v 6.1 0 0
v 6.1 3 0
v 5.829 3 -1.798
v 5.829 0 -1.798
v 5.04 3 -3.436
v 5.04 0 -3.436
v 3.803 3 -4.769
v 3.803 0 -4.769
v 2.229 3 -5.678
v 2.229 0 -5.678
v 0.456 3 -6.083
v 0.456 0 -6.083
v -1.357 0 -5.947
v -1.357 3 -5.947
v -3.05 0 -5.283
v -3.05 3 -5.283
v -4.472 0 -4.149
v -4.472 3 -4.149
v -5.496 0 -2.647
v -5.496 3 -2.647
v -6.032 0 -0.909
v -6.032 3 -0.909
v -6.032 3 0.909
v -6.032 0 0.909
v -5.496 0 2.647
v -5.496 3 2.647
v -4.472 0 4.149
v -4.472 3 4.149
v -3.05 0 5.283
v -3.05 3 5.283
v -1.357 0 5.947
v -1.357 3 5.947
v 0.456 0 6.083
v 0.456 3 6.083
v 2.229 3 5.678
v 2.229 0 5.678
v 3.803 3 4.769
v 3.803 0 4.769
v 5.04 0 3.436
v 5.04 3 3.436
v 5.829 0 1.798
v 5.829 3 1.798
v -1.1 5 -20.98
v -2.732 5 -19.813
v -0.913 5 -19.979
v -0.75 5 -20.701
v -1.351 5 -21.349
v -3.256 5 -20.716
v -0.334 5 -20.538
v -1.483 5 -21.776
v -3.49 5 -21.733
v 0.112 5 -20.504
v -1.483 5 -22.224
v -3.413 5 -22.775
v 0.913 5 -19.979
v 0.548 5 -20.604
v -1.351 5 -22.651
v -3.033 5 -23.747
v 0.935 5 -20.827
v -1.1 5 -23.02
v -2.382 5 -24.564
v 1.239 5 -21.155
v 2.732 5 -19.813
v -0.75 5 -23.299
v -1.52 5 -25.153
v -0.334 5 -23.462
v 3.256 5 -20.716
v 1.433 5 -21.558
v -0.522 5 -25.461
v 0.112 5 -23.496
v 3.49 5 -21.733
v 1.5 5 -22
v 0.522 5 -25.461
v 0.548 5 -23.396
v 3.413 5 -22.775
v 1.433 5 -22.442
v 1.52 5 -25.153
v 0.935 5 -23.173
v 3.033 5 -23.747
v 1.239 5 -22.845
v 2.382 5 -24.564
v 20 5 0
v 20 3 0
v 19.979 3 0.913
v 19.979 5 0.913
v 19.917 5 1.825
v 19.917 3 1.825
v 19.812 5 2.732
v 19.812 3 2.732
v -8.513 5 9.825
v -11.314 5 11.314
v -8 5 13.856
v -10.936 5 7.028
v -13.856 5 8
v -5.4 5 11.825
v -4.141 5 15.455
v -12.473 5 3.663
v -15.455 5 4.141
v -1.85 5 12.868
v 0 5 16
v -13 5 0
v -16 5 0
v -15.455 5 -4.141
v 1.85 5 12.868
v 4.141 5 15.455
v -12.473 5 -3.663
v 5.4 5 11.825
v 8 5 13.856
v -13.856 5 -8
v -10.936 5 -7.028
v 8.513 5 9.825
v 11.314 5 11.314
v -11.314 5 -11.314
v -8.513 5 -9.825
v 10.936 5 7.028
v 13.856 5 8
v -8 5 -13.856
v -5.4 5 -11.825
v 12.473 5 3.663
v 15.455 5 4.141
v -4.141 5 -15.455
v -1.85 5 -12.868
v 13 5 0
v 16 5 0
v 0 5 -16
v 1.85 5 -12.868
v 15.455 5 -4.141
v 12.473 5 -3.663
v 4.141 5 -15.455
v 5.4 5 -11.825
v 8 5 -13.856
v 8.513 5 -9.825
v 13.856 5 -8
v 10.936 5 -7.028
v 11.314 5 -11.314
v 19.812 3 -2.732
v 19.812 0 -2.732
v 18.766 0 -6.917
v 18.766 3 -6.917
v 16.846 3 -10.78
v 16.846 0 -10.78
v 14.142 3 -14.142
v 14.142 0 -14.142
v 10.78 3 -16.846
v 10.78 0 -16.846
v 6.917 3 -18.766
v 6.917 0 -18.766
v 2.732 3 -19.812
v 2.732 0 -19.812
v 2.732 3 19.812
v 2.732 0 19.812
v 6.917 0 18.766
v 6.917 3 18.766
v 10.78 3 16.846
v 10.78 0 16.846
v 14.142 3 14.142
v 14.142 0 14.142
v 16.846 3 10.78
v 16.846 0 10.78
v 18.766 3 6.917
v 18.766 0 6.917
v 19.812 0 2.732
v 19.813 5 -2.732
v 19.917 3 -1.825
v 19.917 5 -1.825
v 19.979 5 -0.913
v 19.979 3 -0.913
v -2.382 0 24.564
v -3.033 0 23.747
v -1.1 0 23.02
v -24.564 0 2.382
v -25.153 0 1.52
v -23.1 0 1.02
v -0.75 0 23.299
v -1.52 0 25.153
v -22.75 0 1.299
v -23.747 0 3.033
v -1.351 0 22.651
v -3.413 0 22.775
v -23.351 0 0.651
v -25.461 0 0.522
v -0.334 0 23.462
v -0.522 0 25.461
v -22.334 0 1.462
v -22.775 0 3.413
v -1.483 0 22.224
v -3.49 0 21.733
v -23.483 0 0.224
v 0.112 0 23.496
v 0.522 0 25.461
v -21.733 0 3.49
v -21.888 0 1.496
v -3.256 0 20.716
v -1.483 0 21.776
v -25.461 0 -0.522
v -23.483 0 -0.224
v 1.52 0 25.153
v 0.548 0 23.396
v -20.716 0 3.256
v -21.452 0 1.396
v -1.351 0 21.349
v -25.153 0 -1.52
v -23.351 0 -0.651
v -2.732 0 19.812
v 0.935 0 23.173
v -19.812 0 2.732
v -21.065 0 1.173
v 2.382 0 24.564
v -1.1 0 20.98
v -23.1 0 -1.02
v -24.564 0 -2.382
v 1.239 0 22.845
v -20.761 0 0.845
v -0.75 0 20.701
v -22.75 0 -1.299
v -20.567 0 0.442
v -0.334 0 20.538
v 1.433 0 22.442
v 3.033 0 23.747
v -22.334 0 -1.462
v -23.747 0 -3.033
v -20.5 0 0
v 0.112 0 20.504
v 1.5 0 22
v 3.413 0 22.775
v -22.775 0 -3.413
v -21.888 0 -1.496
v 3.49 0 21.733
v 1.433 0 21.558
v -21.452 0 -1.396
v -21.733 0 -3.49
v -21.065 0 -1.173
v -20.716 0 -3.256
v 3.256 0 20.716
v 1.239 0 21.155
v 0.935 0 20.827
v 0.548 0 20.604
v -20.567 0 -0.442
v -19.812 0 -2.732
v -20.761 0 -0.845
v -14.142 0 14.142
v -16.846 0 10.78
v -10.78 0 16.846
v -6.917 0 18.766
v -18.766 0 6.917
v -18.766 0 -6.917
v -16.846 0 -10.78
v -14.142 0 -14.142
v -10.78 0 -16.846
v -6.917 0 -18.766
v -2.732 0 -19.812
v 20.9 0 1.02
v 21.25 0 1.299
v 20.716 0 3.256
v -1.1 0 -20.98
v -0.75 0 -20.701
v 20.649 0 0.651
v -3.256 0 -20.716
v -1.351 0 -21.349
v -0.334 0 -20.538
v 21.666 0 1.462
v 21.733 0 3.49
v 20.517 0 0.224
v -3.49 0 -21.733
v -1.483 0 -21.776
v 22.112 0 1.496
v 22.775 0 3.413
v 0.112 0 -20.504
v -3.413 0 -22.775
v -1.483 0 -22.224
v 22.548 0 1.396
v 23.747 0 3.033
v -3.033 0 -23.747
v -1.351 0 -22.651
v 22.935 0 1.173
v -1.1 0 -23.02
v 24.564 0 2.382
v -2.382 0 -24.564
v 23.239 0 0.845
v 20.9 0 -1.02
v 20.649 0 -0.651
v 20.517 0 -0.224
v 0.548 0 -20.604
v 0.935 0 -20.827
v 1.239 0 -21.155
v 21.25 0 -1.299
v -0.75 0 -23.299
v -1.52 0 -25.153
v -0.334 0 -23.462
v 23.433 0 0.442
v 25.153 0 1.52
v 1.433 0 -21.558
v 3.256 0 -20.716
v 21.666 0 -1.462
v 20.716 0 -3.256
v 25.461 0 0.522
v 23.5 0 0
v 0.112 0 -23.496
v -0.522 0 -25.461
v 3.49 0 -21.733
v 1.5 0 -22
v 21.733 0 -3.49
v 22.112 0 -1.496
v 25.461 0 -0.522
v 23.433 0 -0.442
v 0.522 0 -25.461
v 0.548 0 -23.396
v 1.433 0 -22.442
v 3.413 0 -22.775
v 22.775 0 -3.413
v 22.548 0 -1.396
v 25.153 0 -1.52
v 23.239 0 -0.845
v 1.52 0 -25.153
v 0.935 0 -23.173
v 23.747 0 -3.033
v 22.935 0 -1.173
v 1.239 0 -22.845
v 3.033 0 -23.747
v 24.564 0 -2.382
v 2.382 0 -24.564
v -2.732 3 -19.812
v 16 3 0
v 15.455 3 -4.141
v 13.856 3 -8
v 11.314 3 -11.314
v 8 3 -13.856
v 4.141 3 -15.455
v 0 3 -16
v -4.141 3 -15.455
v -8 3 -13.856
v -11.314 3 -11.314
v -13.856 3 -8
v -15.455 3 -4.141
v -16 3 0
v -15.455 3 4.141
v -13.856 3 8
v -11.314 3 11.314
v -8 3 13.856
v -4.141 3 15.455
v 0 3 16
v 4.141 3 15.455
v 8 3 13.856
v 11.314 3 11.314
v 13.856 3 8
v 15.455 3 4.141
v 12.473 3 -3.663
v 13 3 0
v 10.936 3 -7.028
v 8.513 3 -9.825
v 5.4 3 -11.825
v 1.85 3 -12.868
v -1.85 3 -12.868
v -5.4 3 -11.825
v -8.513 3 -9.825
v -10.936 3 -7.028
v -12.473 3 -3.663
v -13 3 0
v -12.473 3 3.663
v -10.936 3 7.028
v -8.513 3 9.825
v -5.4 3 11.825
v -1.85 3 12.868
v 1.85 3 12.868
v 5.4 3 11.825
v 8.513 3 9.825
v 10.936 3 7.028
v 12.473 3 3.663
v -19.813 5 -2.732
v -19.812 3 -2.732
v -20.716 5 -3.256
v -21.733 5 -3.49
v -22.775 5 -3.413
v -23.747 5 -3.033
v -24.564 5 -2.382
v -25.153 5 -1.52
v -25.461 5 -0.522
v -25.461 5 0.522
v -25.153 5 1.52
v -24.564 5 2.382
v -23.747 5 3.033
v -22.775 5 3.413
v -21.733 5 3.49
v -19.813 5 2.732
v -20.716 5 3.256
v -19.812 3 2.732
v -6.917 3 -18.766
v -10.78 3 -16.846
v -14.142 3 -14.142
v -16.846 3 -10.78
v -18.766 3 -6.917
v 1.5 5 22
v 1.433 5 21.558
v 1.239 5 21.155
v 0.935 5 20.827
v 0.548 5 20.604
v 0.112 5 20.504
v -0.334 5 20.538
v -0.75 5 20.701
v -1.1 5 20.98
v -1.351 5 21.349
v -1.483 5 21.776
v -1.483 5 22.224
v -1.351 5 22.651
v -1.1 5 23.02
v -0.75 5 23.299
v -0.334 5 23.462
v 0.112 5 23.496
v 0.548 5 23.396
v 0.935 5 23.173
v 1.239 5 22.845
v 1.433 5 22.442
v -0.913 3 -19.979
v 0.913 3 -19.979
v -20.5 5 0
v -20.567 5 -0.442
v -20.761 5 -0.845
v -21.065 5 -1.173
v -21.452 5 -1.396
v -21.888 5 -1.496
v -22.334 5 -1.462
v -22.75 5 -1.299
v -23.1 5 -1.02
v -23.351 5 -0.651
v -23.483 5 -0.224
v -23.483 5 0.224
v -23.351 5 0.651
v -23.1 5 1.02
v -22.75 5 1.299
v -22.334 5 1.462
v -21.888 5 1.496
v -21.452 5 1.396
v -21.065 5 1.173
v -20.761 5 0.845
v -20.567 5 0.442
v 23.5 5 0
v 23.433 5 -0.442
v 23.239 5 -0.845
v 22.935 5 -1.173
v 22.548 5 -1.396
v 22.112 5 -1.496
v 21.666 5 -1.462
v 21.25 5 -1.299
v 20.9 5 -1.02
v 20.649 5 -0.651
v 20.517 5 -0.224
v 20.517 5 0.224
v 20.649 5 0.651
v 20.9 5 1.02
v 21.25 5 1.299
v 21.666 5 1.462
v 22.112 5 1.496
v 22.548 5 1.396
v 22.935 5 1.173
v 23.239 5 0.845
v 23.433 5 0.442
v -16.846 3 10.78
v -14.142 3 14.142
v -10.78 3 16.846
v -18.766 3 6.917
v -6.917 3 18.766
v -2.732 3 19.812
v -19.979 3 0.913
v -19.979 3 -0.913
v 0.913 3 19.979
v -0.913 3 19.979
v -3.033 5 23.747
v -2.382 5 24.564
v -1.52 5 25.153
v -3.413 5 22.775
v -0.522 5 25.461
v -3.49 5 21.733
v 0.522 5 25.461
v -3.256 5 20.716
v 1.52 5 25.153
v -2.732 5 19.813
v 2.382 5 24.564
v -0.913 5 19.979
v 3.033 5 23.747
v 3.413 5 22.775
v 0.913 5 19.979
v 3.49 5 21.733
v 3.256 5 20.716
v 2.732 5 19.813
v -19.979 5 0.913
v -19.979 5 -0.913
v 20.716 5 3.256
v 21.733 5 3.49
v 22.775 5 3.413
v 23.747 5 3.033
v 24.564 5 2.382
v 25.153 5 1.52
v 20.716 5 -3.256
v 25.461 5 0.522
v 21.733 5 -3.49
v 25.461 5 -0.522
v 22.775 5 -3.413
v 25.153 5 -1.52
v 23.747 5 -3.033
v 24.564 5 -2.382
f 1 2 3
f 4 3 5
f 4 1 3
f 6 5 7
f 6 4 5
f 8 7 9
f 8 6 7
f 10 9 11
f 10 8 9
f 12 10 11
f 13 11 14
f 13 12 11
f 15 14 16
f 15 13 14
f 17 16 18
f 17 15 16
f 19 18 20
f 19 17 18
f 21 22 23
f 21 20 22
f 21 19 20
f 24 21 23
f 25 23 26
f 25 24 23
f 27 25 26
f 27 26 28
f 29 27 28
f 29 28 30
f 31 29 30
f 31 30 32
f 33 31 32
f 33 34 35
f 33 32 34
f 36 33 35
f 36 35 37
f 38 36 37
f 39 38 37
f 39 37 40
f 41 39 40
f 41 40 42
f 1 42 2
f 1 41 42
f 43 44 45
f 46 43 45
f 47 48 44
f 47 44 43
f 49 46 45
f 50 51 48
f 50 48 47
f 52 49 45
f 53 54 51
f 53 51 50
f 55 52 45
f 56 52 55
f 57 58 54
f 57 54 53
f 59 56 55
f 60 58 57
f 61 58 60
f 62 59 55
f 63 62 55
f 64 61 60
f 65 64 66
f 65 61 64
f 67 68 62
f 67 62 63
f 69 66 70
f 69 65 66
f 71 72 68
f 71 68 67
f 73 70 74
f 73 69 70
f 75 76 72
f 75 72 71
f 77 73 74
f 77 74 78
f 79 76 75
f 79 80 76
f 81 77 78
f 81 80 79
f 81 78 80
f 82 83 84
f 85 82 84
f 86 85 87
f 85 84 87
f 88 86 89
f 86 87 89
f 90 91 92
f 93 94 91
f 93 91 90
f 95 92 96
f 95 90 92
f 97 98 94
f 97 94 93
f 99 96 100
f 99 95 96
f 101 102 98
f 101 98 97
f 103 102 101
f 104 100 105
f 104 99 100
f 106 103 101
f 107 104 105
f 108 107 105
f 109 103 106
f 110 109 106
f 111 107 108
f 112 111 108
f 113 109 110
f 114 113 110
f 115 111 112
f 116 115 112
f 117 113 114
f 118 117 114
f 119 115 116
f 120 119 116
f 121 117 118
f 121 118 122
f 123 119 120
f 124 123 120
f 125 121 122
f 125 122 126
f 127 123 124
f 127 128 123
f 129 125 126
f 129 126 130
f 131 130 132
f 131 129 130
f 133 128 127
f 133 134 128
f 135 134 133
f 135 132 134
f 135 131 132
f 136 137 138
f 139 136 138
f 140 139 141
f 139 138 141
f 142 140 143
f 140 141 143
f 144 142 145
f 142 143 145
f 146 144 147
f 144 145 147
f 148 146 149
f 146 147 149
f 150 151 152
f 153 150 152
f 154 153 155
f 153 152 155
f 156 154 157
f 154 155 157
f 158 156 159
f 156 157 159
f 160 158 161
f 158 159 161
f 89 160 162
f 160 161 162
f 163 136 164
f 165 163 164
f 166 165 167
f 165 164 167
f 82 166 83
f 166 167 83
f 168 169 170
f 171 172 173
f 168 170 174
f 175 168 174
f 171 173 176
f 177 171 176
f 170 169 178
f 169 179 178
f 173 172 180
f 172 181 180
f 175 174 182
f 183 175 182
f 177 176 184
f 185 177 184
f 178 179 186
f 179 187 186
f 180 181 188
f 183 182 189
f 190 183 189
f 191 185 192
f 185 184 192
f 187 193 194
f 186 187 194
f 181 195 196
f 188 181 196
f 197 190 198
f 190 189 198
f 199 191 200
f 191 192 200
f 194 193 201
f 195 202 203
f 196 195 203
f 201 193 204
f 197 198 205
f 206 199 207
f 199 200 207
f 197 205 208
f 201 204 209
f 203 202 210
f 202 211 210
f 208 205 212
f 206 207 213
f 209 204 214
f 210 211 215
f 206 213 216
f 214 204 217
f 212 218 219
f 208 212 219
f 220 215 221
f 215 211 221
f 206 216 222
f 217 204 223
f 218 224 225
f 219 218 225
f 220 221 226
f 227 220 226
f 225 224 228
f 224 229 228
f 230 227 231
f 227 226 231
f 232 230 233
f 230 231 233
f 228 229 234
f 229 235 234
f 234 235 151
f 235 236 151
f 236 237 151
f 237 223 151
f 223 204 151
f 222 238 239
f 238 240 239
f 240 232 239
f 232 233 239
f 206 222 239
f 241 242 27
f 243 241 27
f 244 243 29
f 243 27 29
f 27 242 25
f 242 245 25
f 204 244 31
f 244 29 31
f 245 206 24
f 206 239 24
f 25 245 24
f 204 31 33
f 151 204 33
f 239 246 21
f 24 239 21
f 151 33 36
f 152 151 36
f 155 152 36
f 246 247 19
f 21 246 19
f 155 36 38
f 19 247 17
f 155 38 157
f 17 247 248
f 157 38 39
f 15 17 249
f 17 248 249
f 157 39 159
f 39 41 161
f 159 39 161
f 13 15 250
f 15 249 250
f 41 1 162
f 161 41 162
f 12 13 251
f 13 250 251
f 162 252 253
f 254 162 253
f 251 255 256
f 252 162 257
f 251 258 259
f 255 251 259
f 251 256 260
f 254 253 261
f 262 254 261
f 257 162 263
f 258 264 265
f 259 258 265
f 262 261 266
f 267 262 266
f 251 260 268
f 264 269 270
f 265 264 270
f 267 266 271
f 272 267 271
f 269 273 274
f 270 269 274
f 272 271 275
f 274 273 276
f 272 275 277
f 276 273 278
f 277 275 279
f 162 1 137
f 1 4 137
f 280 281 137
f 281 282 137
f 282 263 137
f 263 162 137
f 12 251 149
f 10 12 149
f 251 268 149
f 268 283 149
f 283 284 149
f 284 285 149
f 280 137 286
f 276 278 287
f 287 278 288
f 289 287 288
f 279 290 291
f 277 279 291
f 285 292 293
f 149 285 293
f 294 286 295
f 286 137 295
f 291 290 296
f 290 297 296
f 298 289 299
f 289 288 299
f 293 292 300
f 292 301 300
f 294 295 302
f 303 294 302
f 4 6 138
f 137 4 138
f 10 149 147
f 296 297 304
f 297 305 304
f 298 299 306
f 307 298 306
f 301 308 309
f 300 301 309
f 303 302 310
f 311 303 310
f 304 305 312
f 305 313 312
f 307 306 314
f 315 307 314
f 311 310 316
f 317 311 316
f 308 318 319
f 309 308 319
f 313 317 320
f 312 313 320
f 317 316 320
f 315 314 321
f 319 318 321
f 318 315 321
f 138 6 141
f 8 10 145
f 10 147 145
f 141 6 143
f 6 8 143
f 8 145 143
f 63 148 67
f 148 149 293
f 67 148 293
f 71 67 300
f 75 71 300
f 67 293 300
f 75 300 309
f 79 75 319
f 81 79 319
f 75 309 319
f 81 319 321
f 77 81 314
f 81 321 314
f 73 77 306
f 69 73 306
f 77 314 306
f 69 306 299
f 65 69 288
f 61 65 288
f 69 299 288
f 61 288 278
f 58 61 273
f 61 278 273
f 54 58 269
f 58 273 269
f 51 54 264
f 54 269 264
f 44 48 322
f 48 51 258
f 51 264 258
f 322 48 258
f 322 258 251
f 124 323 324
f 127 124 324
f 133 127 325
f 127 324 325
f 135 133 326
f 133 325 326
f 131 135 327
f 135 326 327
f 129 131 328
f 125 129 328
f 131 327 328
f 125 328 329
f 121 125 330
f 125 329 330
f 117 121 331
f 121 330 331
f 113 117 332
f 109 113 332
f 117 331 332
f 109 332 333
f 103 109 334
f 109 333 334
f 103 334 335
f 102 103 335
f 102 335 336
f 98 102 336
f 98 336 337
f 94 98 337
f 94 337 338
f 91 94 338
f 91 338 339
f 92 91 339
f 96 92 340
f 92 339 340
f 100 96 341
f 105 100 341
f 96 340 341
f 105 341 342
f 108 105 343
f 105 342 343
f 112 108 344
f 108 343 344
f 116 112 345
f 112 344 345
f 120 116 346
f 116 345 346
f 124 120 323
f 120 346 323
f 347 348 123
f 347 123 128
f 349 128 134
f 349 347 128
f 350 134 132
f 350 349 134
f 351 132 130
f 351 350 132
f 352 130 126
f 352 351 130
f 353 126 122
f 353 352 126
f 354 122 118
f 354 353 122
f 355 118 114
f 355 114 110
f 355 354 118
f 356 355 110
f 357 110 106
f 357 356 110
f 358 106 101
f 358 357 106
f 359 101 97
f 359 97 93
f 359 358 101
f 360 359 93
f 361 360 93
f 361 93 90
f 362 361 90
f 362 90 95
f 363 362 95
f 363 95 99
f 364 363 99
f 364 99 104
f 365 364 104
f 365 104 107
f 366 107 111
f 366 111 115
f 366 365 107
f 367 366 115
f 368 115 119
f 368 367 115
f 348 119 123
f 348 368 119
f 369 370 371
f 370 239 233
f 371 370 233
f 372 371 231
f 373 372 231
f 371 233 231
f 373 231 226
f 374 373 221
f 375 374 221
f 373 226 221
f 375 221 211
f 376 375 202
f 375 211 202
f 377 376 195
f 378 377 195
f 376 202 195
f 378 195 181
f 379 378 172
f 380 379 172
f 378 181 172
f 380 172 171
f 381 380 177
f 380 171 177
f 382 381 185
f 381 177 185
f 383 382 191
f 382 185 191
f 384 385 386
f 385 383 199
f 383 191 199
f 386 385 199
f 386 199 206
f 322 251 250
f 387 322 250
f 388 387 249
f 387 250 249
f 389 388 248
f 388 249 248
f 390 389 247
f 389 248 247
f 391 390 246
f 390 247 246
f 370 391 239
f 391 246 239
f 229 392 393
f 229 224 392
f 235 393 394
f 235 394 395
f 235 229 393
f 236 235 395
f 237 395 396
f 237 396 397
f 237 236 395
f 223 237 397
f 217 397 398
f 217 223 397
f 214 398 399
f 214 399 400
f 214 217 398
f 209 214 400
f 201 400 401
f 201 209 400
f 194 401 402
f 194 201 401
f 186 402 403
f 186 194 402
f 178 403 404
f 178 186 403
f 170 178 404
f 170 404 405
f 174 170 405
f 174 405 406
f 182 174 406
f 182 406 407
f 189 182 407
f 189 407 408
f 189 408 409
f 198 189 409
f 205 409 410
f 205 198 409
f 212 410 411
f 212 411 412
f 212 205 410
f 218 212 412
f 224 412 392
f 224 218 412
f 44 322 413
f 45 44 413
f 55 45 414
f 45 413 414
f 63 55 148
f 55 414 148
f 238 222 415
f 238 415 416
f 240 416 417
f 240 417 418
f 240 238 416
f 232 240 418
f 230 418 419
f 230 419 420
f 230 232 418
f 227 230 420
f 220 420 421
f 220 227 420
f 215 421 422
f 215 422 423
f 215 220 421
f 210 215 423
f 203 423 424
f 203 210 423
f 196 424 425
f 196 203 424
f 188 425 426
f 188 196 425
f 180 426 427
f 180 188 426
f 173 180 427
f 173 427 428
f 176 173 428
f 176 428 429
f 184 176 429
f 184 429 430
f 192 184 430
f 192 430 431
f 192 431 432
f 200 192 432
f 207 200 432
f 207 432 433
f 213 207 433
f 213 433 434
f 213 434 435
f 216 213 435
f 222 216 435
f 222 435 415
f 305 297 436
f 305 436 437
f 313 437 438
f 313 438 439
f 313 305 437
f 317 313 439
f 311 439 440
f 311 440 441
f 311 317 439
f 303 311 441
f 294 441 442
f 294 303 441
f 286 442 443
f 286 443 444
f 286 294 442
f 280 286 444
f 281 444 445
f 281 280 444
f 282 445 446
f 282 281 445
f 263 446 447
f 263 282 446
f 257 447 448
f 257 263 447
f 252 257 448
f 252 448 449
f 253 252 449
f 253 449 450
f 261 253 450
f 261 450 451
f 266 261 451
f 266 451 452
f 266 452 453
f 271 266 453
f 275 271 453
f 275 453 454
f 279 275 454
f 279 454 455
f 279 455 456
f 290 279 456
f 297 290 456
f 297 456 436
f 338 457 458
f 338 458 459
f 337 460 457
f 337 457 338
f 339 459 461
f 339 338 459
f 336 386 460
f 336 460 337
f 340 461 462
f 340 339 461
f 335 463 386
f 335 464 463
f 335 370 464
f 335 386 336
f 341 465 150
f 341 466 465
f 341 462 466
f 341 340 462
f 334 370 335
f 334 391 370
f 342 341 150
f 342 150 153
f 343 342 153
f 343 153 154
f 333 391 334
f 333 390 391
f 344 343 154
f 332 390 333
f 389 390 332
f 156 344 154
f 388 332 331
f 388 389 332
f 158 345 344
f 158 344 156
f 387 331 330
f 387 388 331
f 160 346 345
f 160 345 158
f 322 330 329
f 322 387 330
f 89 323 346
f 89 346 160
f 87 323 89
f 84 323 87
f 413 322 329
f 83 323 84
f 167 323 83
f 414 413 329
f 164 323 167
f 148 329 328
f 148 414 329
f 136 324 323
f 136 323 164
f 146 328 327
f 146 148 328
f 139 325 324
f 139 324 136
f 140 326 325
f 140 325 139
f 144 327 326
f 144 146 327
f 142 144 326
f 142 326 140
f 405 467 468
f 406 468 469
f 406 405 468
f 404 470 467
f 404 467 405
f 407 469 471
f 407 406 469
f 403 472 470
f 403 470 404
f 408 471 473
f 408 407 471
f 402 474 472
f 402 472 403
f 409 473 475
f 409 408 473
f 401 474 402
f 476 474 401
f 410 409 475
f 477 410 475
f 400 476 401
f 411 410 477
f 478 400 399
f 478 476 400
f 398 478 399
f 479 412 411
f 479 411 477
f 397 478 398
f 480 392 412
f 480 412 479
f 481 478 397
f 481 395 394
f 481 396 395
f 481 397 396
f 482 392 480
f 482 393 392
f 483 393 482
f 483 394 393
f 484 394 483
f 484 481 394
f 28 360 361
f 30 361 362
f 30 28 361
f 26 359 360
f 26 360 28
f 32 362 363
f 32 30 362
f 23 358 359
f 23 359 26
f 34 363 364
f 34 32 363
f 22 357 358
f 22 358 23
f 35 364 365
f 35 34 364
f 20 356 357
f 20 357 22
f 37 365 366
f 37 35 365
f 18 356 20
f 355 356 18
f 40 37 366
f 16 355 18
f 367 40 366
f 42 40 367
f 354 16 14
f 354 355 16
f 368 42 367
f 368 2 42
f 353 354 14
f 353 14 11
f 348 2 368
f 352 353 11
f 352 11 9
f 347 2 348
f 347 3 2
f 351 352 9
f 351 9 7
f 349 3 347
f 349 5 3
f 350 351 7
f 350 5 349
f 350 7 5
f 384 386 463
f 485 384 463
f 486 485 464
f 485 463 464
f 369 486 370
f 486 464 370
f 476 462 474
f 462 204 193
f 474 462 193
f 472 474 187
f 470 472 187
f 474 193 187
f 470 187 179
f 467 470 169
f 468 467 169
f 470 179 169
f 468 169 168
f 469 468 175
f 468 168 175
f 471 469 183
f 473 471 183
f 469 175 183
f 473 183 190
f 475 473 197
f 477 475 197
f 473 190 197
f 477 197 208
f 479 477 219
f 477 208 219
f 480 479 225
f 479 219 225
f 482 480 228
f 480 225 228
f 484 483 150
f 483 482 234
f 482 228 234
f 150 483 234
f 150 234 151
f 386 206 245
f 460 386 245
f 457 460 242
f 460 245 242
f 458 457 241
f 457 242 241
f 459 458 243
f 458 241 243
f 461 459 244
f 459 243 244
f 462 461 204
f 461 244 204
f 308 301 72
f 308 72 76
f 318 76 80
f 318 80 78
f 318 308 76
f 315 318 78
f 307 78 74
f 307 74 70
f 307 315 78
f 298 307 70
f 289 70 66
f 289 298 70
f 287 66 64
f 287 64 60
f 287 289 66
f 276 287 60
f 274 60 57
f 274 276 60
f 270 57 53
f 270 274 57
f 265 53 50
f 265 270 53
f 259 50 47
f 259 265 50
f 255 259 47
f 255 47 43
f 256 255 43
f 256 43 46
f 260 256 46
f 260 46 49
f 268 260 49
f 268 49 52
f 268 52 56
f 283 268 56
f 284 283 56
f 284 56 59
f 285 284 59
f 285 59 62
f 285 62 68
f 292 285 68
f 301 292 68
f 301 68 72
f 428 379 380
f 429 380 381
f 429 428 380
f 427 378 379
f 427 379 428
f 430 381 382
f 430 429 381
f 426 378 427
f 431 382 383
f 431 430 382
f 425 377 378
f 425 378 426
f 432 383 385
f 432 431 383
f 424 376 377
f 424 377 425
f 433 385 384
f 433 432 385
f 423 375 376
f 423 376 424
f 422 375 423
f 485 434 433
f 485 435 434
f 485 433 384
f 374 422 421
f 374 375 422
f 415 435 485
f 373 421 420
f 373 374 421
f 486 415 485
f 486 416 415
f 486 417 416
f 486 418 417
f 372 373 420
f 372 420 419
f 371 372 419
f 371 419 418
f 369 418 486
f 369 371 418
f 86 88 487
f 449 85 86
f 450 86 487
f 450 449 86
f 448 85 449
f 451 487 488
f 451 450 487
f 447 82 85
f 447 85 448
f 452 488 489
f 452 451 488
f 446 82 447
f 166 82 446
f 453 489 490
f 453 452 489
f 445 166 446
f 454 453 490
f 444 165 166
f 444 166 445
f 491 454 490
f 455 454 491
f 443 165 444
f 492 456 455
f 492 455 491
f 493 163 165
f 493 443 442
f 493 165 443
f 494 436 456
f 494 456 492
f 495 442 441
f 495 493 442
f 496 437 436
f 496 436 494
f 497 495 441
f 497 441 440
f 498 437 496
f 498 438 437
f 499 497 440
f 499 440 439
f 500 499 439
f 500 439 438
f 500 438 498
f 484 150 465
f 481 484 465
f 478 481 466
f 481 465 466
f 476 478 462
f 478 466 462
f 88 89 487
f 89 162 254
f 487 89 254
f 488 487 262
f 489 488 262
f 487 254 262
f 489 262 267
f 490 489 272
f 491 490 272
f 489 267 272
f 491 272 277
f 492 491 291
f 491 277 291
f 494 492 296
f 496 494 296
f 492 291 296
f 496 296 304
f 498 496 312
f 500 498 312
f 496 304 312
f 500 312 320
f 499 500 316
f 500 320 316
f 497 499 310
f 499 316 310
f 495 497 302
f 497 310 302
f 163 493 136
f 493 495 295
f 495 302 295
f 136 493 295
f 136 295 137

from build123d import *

# Parameters (mm, degrees)
SKETCH1_R           = 1.5
BOSS_EXTRUDE1_DEPTH = 3
BOSS_EXTRUDE2_START = 3
SKETCH1_4_R         = 1.5
SKETCH1_4_R_2       = 16
SKETCH1_4_R_3       = 13
BOSS_EXTRUDE2_DEPTH = 2
SKETCH1_5_R         = 6.1
CUT_EXTRUDE1_DEPTH  = 10


with BuildPart() as part:
    # Sketch1 → Boss-Extrude1 (new body)
    with BuildSketch(Plane(origin=(0, 0, 0), x_dir=(1, 0, 0), z_dir=(0, 1, 0))):
        with BuildLine():
            ThreePointArc((19.8125, 2.732186624), (14.142135624, 14.142135624), (2.732186624, 19.8125))
            ThreePointArc((2.732186624, 19.8125), (0, 25.5), (-2.732186624, 19.8125))
            ThreePointArc((-2.732186624, 19.8125), (-14.142135624, 14.142135624), (-19.8125, 2.732186624))
            ThreePointArc((-19.8125, 2.732186624), (-25.5, 0), (-19.8125, -2.732186624))
            ThreePointArc((-19.8125, -2.732186624), (-14.142135624, -14.142135624), (-2.732186624, -19.8125))
            ThreePointArc((-2.732186624, -19.8125), (0, -25.5), (2.732186624, -19.8125))
            ThreePointArc((2.732186624, -19.8125), (14.142135624, -14.142135624), (19.8125, -2.732186624))
            ThreePointArc((19.8125, -2.732186624), (25.5, 0), (19.8125, 2.732186624))
        make_face()
        with Locations((22, 0)):
            Circle(SKETCH1_R, mode=Mode.SUBTRACT)
        with Locations((0, 22)):
            Circle(SKETCH1_R, mode=Mode.SUBTRACT)
        with Locations((0, -22)):
            Circle(SKETCH1_R, mode=Mode.SUBTRACT)
        with Locations((-22, 0)):
            Circle(SKETCH1_R, mode=Mode.SUBTRACT)
    extrude(amount=BOSS_EXTRUDE1_DEPTH)

    # Sketch1_4 → Boss-Extrude2 (add)
    with BuildSketch(Plane(origin=(0, 0, 0), x_dir=(1, 0, 0), z_dir=(0, 1, 0)).offset(BOSS_EXTRUDE2_START)):
        with BuildLine():
            ThreePointArc((-2.732186624, -19.8125), (0, -25.5), (2.732186624, -19.8125))
            ThreePointArc((2.732186624, -19.8125), (0, -20), (-2.732186624, -19.8125))
        make_face()
        with Locations((0, -22)):
            Circle(SKETCH1_4_R, mode=Mode.SUBTRACT)
        with BuildLine():
            ThreePointArc((19.8125, 2.732186624), (19.953069939, 1.369306394), (20, 0))
            ThreePointArc((20, 0), (19.953069939, -1.369306394), (19.8125, -2.732186624))
            ThreePointArc((19.8125, -2.732186624), (25.5, 0), (19.8125, 2.732186624))
        make_face()
        with Locations((22, 0)):
            Circle(SKETCH1_4_R, mode=Mode.SUBTRACT)
        with BuildLine():
            ThreePointArc((-2.732186624, 19.8125), (0, 20), (2.732186624, 19.8125))
            ThreePointArc((2.732186624, 19.8125), (0, 25.5), (-2.732186624, 19.8125))
        make_face()
        with Locations((0, 22)):
            Circle(SKETCH1_4_R, mode=Mode.SUBTRACT)
        with BuildLine():
            ThreePointArc((-19.8125, -2.732186624), (-20, 0), (-19.8125, 2.732186624))
            ThreePointArc((-19.8125, 2.732186624), (-25.5, 0), (-19.8125, -2.732186624))
        make_face()
        with Locations((-22, 0)):
            Circle(SKETCH1_4_R, mode=Mode.SUBTRACT)
        Circle(SKETCH1_4_R_2)
        Circle(SKETCH1_4_R_3, mode=Mode.SUBTRACT)
    extrude(amount=BOSS_EXTRUDE2_DEPTH)

    # Sketch1_5 → Cut-Extrude1 (cut)
    with BuildSketch(Plane(origin=(0, 0, 0), x_dir=(1, 0, 0), z_dir=(0, 1, 0))):
        Circle(SKETCH1_5_R)
    extrude(amount=CUT_EXTRUDE1_DEPTH, mode=Mode.SUBTRACT)


solid = part.part
